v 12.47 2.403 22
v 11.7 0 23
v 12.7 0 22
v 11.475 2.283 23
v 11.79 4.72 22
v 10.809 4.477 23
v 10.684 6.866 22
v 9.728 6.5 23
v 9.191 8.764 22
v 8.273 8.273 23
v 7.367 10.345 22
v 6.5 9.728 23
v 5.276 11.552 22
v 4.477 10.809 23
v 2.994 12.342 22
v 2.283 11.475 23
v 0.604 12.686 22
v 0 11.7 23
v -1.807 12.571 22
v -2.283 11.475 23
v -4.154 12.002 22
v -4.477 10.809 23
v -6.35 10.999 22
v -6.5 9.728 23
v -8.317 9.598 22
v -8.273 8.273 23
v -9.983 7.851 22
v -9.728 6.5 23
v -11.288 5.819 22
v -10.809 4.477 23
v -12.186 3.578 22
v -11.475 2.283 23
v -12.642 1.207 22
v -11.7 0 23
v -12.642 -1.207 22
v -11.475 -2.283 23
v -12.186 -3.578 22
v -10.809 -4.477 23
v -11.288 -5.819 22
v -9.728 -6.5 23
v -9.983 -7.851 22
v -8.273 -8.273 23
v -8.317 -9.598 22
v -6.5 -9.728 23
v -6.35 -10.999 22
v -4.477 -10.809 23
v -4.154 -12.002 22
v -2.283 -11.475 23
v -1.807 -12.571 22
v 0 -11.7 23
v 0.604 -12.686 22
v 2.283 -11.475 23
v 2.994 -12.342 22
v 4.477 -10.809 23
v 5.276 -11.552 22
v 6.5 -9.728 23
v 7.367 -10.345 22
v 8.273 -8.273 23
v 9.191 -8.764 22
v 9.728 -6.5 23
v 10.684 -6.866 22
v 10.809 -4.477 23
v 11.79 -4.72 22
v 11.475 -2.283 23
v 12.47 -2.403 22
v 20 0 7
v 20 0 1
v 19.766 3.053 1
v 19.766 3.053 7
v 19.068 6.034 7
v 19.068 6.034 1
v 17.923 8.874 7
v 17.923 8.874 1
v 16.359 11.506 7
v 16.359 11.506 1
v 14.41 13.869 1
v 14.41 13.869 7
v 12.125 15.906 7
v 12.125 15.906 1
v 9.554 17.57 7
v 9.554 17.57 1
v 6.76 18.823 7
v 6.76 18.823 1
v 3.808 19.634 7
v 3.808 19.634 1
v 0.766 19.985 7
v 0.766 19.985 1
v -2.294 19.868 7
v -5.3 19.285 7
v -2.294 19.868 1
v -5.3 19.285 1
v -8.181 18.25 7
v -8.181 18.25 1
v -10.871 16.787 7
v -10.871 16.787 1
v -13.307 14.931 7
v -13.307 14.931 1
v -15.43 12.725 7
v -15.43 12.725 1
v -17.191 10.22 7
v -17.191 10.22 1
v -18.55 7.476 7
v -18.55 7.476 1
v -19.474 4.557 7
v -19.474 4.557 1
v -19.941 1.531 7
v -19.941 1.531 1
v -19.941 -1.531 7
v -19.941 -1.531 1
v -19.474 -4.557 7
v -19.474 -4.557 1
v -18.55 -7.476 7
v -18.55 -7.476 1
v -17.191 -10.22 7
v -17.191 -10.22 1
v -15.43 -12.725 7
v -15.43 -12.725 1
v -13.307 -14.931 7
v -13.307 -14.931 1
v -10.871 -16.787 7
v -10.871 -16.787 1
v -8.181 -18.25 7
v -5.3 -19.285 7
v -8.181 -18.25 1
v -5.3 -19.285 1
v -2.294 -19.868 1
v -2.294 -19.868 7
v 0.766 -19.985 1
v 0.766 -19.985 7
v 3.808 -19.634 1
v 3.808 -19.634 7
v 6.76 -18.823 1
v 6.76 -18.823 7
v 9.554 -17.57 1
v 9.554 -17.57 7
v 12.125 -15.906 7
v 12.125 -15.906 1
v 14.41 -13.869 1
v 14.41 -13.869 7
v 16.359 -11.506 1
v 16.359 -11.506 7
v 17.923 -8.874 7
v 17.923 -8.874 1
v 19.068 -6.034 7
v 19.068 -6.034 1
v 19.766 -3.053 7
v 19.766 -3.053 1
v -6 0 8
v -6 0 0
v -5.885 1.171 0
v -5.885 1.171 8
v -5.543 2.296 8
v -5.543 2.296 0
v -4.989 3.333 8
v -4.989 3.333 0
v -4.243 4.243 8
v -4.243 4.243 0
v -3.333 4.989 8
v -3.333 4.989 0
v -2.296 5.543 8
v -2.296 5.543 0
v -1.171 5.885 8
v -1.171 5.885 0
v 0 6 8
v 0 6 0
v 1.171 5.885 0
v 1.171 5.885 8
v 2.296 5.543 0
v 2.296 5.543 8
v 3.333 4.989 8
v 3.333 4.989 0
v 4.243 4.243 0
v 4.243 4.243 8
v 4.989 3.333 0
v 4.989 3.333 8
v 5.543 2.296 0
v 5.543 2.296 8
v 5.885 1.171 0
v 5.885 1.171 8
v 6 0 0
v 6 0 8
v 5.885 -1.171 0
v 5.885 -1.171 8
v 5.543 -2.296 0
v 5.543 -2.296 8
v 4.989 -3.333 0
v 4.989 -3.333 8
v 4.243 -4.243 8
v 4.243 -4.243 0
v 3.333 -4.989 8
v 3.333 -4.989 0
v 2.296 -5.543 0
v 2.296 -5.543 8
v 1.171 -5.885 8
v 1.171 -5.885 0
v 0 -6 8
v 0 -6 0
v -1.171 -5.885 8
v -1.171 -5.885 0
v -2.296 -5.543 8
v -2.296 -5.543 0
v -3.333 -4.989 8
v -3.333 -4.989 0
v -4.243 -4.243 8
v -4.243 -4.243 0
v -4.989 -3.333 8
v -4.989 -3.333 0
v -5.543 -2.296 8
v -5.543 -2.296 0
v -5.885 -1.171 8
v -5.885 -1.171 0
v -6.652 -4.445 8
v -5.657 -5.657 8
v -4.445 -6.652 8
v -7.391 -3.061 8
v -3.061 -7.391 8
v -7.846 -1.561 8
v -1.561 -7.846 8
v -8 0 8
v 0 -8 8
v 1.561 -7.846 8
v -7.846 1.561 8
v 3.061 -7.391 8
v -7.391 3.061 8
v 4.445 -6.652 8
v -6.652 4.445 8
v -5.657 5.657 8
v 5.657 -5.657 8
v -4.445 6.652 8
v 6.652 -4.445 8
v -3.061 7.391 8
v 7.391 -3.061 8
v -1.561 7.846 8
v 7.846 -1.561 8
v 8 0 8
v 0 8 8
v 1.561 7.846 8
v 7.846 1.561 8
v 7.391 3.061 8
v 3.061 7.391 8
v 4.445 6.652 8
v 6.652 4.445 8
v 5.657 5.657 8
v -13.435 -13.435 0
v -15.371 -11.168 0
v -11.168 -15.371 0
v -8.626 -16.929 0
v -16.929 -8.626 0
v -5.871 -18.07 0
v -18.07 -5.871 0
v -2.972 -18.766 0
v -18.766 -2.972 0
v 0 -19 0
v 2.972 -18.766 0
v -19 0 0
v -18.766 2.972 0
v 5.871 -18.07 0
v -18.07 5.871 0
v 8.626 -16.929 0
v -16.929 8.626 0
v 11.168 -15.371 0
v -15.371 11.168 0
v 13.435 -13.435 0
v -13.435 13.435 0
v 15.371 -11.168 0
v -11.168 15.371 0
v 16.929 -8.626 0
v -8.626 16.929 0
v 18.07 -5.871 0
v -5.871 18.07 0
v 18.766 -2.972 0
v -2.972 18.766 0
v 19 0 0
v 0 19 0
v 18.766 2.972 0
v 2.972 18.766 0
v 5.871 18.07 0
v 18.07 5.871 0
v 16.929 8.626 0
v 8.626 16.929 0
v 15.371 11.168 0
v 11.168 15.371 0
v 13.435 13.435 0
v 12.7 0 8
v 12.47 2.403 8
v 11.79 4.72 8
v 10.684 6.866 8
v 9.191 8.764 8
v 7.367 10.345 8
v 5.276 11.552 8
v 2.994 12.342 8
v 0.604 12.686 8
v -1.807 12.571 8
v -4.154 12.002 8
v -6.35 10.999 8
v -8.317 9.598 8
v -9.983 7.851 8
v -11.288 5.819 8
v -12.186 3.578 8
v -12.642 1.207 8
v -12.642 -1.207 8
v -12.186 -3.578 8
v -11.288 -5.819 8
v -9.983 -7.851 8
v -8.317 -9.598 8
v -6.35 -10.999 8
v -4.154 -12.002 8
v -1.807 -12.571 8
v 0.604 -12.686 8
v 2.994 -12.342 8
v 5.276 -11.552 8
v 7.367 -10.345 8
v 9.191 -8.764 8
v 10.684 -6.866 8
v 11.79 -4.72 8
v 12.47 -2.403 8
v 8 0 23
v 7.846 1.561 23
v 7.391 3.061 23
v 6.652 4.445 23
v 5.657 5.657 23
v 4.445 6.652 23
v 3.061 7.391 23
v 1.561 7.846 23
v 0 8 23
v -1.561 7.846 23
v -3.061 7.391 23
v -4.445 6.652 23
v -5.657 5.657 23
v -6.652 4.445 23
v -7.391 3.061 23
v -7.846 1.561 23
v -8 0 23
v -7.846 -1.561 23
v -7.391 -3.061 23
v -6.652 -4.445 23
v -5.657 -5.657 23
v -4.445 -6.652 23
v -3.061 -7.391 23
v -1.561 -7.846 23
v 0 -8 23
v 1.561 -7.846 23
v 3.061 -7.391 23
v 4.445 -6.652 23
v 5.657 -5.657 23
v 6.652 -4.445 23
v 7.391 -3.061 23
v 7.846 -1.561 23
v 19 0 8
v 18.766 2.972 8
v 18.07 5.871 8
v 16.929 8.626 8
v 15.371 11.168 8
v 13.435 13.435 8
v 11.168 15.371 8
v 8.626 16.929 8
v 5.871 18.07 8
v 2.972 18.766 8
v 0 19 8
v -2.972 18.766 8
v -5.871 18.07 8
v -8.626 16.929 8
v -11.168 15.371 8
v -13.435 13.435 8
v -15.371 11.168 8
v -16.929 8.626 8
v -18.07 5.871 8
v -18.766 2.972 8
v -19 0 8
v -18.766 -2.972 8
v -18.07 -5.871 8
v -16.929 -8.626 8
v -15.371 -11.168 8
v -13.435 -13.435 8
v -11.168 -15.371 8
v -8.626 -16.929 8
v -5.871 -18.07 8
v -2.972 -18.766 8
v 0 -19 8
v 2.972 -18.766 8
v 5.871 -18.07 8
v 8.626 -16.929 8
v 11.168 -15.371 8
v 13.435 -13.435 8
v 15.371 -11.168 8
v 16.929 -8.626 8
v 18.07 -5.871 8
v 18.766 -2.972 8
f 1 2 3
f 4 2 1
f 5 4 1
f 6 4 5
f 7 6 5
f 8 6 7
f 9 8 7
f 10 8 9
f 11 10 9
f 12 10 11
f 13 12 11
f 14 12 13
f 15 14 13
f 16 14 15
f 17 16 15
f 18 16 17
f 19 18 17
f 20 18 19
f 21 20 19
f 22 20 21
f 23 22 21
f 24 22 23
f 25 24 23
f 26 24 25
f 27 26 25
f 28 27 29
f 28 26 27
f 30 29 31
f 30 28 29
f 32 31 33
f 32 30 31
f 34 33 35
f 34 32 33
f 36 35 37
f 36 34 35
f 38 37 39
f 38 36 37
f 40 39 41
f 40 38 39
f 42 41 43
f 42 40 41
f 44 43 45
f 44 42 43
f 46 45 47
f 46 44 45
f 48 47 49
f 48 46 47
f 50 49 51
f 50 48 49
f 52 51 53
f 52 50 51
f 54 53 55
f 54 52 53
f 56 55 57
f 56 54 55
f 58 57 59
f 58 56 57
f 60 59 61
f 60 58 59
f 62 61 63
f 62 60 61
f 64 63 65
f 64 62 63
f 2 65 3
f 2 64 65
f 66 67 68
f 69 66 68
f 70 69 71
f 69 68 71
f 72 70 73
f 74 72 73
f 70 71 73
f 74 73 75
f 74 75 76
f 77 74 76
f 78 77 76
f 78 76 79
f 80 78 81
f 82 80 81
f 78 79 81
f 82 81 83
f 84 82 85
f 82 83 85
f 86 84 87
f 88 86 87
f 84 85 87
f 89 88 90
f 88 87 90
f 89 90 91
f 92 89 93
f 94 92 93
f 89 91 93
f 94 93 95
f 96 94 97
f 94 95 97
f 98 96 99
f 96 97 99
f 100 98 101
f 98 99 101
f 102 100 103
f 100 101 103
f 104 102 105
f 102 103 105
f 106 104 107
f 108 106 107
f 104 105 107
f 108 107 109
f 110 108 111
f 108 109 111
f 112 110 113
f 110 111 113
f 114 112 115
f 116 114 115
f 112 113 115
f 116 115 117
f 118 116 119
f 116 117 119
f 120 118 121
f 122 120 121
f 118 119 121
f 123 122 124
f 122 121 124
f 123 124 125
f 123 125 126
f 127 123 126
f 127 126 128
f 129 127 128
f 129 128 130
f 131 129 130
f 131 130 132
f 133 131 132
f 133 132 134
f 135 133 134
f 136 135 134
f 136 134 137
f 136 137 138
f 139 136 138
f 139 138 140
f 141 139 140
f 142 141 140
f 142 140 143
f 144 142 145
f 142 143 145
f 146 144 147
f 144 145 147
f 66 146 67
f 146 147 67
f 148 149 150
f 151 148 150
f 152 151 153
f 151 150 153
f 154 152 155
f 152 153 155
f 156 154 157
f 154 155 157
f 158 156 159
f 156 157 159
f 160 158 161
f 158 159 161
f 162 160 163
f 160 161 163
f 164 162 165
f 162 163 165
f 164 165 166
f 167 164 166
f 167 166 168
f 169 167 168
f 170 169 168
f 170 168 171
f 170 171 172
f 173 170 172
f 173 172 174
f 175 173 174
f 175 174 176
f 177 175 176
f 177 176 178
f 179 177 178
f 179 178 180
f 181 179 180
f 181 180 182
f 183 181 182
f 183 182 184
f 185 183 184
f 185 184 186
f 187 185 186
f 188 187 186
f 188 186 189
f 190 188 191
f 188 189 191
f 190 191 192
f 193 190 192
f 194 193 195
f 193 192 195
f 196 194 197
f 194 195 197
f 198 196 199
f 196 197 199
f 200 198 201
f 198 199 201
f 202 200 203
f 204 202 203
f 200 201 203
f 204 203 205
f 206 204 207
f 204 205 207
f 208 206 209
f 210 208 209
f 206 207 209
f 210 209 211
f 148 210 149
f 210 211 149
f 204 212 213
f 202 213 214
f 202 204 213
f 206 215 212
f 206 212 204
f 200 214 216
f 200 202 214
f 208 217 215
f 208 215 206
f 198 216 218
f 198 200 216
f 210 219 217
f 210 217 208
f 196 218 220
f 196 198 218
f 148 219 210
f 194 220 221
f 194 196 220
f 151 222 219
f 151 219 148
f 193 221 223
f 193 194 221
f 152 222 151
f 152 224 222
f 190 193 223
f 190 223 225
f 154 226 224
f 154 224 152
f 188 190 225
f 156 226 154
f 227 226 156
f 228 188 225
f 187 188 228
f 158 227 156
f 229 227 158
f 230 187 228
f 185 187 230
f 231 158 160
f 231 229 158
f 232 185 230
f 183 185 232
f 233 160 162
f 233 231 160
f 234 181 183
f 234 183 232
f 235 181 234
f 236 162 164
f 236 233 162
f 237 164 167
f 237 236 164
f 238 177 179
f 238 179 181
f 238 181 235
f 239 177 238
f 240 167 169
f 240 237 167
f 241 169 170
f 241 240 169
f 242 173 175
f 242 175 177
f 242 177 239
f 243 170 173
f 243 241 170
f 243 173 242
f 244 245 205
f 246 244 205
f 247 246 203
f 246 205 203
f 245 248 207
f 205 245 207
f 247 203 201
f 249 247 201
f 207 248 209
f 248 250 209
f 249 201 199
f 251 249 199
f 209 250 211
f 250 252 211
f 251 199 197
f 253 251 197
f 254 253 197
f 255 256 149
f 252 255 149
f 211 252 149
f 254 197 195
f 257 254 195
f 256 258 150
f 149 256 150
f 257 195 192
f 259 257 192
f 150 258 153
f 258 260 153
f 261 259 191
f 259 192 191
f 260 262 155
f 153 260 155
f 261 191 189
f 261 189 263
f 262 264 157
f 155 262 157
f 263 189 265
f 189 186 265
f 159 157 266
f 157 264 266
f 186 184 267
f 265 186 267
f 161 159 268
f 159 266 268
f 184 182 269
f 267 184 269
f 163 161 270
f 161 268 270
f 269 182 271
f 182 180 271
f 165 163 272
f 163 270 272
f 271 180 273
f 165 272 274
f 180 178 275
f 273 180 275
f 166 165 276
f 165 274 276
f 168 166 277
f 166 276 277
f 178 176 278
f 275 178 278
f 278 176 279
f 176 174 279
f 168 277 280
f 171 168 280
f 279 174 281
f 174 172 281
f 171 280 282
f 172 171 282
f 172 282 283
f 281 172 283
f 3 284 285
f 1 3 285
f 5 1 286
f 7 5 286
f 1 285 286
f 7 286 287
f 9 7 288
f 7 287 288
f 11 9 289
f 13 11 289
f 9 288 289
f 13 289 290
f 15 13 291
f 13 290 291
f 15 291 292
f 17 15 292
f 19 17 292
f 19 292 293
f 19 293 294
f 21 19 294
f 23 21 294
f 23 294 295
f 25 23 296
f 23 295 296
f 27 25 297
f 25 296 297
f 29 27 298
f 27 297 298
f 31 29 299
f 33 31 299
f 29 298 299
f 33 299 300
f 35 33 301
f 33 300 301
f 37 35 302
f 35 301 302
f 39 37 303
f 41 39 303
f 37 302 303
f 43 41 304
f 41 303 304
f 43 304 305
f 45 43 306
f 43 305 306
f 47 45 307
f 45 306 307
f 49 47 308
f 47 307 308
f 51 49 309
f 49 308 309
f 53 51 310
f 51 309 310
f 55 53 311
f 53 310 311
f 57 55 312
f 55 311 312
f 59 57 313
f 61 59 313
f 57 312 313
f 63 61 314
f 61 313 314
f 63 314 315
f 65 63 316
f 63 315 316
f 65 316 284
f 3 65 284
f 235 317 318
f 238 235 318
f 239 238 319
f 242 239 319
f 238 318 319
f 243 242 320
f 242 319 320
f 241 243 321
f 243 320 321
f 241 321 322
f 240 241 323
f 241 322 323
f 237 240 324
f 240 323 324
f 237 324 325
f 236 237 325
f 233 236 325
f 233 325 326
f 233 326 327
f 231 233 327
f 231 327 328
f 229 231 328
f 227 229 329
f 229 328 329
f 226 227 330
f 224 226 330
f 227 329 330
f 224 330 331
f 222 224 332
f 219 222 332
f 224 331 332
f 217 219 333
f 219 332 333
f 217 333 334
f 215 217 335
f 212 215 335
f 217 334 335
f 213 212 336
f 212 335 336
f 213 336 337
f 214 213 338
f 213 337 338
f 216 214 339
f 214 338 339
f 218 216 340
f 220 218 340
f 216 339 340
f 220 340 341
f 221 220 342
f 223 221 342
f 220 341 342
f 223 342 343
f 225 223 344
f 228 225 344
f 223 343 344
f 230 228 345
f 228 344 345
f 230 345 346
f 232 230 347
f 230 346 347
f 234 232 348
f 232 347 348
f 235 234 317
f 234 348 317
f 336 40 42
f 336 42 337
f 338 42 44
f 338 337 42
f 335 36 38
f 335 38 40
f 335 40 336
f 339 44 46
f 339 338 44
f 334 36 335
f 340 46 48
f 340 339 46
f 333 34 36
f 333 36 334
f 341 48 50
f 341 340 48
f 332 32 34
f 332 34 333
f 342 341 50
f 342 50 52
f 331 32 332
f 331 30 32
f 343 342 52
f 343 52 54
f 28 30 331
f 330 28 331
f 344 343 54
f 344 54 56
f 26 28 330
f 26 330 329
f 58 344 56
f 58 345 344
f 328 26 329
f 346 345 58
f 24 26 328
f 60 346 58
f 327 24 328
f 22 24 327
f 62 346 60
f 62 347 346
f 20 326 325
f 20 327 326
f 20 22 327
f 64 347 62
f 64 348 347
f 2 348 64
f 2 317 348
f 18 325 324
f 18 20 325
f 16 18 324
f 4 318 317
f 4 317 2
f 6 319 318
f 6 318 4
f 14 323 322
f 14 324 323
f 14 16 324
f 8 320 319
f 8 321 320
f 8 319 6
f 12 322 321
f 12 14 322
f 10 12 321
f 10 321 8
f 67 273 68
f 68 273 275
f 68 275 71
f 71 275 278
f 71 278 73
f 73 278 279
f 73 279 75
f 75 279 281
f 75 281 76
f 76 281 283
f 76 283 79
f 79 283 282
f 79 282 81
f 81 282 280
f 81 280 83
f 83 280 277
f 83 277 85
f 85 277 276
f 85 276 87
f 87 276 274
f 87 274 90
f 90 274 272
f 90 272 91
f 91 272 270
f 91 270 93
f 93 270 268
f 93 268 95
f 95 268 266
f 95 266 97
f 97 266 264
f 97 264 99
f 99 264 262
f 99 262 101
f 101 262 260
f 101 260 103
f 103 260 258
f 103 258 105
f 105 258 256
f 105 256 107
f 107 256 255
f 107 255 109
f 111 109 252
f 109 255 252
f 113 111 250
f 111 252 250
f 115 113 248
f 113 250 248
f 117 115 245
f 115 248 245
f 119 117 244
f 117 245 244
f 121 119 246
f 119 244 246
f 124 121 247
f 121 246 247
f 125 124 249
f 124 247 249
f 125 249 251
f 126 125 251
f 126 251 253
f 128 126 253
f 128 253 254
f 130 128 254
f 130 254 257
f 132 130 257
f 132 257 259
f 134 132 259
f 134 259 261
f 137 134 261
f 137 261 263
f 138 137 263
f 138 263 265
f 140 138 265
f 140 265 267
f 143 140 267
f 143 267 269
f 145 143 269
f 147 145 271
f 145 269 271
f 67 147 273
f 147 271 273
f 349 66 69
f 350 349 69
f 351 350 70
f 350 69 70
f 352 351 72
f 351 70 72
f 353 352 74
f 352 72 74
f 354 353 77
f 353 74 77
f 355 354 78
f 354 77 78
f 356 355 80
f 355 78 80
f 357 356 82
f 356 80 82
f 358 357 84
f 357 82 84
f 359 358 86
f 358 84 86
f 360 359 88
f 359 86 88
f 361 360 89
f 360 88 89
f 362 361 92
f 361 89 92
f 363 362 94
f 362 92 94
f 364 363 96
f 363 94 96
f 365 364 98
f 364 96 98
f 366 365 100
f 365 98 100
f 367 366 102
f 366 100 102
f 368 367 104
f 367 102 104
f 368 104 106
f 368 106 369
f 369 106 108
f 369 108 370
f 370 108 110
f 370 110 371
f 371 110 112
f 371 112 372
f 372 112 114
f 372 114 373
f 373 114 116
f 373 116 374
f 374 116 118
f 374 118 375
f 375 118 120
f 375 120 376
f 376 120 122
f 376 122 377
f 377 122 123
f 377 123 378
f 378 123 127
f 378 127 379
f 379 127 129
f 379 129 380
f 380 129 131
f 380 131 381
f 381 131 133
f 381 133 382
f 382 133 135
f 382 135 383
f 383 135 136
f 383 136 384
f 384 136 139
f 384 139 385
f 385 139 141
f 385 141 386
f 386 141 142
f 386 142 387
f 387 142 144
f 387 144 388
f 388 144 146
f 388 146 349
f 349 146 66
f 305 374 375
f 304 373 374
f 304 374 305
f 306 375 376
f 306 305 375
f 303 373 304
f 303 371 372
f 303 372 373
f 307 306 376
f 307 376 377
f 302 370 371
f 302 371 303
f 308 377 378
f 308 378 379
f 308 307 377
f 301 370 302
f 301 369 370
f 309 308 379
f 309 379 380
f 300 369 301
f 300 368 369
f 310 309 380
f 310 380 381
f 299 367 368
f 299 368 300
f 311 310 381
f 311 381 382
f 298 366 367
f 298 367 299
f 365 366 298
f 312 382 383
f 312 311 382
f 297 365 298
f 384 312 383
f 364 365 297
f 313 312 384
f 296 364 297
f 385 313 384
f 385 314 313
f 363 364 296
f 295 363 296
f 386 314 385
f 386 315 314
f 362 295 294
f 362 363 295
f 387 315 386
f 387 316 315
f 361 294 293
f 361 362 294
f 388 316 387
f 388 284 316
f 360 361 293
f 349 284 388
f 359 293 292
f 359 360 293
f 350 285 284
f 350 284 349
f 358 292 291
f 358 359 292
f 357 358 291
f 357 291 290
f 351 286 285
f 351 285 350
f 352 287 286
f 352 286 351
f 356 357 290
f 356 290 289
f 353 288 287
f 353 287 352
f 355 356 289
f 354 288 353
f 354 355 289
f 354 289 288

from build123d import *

# Parameters (mm, degrees)
ESBO_O1_R                = 20
RESSALTO_EXTRUS_O1_DEPTH = 8
ESBO_O2_R                = 12.7
RESSALTO_EXTRUS_O2_DEPTH = 15
CHANFRO1_SIZE            = 1
ESBO_O3_R                = 8
CORTE_EXTRUS_O1_DEPTH    = 15
ESBO_O4_R                = 6
CORTE_EXTRUS_O2_DEPTH    = 37.455452267
CHANFRO2_SIZE            = 1


with BuildPart() as part:
    # Esboço1 → Ressalto-extrusão1 (new body)
    with BuildSketch(Plane.XY):
        Circle(ESBO_O1_R)
    extrude(amount=RESSALTO_EXTRUS_O1_DEPTH)

    # Esboço2 → Ressalto-extrusão2 (add)
    with BuildSketch(Plane.XY.offset(8)):
        Circle(ESBO_O2_R)
    extrude(amount=RESSALTO_EXTRUS_O2_DEPTH)

    # Chanfro1
    chanfro1_edges = [part.edges().sort_by_distance(p)[0] for p in [
        (-12.7, 0, 23),
    ]]
    chamfer(chanfro1_edges, length=CHANFRO1_SIZE)

    # Esboço3 → Corte-extrusão1 (cut)
    with BuildSketch(Plane.XY.offset(23)):
        Circle(ESBO_O3_R)
    extrude(amount=-CORTE_EXTRUS_O1_DEPTH, mode=Mode.SUBTRACT)

    # Esboço4 → Corte-extrusão2 (cut, through all)
    with BuildSketch(Plane(origin=(0, 0, 0), x_dir=(-1, 0, 0), z_dir=(0, 0, -1))):
        Circle(ESBO_O4_R)
    extrude(amount=-CORTE_EXTRUS_O2_DEPTH, mode=Mode.SUBTRACT)

    # Chanfro2
    chanfro2_edges = [part.edges().sort_by_distance(p)[0] for p in [
        (-20, 0, 0),
        (-20, 0, 8),
    ]]
    chamfer(chanfro2_edges, length=CHANFRO2_SIZE)


solid = part.part
